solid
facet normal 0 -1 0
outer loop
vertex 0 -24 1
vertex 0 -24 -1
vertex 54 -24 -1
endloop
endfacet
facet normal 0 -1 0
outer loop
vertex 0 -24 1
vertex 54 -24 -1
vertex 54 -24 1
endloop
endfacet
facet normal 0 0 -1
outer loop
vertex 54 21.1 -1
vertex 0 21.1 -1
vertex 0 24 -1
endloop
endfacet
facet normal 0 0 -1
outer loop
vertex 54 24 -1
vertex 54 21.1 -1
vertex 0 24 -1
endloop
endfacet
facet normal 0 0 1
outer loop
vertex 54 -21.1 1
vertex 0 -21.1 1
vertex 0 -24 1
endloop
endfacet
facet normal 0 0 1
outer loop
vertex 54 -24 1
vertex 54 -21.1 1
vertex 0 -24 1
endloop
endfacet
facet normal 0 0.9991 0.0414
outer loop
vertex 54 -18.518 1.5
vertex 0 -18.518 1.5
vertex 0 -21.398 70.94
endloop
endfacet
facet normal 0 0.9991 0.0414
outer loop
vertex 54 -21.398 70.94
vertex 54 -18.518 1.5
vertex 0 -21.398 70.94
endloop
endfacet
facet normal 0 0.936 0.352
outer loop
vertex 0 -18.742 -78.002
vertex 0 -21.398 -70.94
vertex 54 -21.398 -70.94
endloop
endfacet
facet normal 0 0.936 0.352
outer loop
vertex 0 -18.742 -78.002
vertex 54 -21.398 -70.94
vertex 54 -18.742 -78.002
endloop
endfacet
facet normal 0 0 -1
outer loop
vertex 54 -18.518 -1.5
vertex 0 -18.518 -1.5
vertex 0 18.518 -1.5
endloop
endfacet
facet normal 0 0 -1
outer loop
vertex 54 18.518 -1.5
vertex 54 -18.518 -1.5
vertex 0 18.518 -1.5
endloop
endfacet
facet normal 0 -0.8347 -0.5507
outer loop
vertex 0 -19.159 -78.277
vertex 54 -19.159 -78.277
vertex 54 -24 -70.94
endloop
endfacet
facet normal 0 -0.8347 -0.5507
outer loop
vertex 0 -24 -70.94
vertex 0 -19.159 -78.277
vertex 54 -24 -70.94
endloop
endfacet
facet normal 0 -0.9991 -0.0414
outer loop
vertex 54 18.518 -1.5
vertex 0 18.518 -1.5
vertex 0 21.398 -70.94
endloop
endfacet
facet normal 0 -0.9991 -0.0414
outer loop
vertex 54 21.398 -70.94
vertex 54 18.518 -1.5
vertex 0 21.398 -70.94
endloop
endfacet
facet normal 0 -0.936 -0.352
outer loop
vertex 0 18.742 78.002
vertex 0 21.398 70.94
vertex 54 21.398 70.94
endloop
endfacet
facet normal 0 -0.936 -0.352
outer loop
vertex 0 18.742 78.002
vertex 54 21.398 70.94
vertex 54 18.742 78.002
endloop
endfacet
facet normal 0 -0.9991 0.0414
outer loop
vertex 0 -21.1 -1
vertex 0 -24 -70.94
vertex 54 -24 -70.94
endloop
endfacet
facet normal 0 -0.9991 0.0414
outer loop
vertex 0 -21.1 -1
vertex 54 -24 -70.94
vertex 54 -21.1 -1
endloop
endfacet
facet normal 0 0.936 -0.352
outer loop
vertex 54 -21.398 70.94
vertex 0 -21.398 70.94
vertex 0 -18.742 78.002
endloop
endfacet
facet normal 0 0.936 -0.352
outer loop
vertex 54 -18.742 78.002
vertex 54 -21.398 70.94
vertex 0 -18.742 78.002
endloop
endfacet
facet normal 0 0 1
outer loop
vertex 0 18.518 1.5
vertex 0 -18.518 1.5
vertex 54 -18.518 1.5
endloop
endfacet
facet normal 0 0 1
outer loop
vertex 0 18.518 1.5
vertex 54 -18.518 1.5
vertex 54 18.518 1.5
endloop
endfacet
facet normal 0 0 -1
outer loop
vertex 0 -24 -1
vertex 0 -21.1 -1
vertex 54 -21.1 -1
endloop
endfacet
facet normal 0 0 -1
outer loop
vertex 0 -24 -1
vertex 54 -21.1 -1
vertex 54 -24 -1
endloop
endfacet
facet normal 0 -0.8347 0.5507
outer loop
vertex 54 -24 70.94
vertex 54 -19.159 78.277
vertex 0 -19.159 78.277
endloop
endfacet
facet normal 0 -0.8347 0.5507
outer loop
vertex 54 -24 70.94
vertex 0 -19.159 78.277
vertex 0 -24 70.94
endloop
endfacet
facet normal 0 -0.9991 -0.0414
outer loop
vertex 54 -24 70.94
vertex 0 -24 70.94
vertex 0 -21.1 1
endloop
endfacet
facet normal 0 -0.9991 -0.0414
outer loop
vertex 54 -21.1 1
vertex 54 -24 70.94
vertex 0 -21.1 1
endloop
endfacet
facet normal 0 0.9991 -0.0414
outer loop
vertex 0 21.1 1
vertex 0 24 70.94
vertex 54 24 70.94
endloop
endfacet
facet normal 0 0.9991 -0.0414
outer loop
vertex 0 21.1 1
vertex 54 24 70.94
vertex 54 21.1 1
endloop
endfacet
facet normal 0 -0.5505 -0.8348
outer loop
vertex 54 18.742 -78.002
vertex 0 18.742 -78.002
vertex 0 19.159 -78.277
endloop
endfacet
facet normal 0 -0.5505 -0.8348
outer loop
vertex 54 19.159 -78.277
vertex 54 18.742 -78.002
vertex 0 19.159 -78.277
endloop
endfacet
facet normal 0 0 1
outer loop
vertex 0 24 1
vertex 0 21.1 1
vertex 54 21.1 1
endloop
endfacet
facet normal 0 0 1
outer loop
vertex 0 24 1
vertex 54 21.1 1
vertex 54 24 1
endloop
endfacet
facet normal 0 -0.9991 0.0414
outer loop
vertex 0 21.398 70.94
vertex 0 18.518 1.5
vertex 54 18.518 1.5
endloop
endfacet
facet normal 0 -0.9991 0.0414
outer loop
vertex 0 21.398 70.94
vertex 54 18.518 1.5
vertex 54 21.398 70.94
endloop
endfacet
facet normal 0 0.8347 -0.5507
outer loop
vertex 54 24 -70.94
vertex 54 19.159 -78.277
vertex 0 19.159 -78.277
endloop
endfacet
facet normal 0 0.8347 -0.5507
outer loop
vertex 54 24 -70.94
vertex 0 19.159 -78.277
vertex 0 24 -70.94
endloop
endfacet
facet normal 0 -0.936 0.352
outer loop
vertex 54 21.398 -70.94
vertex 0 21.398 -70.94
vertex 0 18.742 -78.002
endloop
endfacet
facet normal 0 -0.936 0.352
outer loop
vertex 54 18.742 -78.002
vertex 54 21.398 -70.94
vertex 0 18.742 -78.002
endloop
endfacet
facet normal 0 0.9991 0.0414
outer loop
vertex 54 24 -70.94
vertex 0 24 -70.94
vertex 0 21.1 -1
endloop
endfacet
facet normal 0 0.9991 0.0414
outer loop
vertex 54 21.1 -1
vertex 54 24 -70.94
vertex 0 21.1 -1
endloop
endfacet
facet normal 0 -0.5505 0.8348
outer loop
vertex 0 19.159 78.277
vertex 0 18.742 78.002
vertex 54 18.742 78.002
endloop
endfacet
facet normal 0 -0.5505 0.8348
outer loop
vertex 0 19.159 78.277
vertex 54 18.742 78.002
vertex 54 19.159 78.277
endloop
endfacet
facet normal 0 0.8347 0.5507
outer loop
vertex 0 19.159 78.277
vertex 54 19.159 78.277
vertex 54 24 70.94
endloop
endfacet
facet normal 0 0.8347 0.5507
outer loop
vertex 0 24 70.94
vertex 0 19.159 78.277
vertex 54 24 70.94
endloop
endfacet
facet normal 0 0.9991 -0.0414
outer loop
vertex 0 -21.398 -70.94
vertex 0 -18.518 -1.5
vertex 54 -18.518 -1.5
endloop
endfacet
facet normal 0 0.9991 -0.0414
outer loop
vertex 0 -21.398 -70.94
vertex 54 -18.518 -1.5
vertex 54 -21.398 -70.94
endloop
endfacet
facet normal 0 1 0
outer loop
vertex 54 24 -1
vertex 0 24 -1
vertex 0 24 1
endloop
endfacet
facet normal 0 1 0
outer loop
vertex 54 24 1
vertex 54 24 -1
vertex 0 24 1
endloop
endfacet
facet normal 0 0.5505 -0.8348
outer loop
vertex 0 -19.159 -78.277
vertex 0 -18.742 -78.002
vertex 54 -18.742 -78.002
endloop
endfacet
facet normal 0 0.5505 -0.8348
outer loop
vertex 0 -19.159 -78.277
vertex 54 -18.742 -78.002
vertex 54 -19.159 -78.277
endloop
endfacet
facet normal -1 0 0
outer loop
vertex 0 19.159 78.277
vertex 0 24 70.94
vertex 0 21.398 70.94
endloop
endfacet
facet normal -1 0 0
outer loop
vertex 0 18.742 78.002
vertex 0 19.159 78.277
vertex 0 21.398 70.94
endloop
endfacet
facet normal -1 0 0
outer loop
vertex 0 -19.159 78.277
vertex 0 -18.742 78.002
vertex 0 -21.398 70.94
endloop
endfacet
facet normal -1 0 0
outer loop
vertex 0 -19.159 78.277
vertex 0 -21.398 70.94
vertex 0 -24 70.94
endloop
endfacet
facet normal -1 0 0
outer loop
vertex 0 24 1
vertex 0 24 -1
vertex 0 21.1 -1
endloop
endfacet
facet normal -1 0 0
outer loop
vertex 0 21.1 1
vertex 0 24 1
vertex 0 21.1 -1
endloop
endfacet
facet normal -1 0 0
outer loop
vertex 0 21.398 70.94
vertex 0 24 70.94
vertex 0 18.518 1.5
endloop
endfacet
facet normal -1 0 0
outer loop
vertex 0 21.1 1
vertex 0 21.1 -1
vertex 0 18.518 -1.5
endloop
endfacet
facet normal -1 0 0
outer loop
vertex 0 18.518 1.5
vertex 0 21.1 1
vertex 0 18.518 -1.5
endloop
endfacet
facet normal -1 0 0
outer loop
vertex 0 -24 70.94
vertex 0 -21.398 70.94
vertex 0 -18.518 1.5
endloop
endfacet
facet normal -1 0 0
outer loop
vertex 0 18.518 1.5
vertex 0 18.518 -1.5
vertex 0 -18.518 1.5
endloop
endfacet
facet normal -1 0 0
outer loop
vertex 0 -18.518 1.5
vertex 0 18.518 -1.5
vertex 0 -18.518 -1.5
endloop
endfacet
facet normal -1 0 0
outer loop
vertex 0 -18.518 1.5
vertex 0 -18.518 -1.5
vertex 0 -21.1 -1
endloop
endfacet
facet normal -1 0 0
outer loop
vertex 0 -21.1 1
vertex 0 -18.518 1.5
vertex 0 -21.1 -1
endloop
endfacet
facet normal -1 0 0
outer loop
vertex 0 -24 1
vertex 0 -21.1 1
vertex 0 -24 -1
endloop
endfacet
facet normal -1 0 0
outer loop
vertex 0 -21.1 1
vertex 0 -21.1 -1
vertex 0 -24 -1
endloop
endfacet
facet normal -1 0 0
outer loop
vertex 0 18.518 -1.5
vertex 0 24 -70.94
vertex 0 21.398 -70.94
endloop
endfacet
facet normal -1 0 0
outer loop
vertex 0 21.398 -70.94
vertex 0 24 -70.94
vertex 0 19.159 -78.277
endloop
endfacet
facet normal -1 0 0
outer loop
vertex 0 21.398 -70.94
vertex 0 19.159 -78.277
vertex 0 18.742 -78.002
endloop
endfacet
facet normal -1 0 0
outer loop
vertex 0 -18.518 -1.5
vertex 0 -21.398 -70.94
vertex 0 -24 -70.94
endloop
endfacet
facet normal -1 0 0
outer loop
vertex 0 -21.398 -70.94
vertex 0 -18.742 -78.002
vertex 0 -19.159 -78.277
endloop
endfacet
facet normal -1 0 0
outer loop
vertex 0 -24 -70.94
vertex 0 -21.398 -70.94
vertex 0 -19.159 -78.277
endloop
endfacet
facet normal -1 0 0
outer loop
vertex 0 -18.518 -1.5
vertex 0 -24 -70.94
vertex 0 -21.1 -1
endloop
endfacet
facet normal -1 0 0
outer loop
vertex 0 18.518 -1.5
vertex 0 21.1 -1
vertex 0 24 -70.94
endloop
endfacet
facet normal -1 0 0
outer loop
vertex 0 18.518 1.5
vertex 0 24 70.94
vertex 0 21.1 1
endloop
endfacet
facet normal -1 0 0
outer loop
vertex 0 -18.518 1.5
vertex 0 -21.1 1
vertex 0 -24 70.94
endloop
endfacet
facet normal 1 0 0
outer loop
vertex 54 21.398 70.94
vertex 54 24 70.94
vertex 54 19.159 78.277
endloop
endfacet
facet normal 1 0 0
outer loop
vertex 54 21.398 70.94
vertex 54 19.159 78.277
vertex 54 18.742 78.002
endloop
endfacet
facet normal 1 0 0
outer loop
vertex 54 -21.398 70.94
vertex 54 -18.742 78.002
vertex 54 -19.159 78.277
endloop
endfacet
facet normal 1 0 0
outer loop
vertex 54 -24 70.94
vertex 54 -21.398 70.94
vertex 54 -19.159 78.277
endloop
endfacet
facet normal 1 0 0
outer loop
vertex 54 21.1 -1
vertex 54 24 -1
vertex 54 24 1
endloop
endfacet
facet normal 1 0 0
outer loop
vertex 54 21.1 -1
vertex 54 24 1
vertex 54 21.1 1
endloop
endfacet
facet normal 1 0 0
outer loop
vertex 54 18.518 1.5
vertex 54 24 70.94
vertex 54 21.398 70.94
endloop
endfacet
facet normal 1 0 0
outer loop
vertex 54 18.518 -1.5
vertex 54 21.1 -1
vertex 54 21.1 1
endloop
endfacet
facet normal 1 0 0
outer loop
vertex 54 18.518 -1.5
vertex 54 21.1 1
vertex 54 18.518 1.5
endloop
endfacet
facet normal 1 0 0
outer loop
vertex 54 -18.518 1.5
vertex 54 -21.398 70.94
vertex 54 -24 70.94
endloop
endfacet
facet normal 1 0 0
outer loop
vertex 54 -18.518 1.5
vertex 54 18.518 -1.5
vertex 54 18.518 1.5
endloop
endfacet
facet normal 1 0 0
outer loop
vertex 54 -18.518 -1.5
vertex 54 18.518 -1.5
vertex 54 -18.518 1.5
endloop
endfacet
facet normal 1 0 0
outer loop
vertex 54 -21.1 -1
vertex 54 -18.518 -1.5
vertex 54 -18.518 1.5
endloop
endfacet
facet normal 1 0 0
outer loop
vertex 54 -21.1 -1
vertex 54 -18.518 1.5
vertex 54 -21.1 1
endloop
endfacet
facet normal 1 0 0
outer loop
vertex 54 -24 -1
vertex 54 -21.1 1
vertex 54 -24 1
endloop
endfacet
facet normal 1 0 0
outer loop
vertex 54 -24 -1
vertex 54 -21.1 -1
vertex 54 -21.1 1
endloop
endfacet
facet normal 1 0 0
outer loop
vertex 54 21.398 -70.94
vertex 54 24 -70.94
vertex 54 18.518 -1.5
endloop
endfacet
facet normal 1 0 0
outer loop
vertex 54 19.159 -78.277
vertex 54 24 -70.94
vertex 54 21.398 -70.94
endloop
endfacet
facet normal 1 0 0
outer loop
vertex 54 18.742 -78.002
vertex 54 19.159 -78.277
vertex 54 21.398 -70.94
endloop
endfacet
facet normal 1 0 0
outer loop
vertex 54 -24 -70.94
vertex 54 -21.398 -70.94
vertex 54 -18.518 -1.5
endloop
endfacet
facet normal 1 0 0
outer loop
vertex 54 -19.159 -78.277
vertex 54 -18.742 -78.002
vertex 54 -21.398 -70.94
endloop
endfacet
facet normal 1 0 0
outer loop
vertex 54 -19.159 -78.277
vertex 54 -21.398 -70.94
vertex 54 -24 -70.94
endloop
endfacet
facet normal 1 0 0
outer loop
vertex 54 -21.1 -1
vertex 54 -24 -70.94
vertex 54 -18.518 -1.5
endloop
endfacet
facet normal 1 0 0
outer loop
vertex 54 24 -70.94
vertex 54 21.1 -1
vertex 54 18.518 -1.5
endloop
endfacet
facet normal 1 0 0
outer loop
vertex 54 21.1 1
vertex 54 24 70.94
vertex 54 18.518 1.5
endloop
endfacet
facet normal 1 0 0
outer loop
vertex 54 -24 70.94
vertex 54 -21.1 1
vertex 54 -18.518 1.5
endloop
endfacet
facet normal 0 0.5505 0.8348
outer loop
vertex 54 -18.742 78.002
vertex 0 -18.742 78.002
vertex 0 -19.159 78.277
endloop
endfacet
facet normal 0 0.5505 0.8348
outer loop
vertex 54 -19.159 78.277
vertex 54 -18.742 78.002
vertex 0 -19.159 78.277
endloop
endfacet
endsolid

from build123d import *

# Parameters (mm, degrees)
F1_DEPTH = 54


with BuildPart() as f1:
    # F0 (on Right) → F1 (new body)
    with BuildSketch(Plane.YZ):
        Polygon((-24, 0), (0, 0), (0, 1.5), (-18.518498, 1.5), (-21.397766, 70.939903), (-18.741725, 78.002092), (-19.159078, 78.27744), (-24, 70.939903), (-21.1, 1), (-24, 1), align=None)
    extrude(amount=F1_DEPTH)

    # F2: F1 across plane


with BuildPart() as f1_1:
    add(f1.part)
    add(f1.part.mirror(Plane.XZ))

    # F3: F1 across plane


with BuildPart() as f1_2:
    add(f1_1.part)
    add(f1_1.part.mirror(Plane.XY))


solid = f1_2.part
